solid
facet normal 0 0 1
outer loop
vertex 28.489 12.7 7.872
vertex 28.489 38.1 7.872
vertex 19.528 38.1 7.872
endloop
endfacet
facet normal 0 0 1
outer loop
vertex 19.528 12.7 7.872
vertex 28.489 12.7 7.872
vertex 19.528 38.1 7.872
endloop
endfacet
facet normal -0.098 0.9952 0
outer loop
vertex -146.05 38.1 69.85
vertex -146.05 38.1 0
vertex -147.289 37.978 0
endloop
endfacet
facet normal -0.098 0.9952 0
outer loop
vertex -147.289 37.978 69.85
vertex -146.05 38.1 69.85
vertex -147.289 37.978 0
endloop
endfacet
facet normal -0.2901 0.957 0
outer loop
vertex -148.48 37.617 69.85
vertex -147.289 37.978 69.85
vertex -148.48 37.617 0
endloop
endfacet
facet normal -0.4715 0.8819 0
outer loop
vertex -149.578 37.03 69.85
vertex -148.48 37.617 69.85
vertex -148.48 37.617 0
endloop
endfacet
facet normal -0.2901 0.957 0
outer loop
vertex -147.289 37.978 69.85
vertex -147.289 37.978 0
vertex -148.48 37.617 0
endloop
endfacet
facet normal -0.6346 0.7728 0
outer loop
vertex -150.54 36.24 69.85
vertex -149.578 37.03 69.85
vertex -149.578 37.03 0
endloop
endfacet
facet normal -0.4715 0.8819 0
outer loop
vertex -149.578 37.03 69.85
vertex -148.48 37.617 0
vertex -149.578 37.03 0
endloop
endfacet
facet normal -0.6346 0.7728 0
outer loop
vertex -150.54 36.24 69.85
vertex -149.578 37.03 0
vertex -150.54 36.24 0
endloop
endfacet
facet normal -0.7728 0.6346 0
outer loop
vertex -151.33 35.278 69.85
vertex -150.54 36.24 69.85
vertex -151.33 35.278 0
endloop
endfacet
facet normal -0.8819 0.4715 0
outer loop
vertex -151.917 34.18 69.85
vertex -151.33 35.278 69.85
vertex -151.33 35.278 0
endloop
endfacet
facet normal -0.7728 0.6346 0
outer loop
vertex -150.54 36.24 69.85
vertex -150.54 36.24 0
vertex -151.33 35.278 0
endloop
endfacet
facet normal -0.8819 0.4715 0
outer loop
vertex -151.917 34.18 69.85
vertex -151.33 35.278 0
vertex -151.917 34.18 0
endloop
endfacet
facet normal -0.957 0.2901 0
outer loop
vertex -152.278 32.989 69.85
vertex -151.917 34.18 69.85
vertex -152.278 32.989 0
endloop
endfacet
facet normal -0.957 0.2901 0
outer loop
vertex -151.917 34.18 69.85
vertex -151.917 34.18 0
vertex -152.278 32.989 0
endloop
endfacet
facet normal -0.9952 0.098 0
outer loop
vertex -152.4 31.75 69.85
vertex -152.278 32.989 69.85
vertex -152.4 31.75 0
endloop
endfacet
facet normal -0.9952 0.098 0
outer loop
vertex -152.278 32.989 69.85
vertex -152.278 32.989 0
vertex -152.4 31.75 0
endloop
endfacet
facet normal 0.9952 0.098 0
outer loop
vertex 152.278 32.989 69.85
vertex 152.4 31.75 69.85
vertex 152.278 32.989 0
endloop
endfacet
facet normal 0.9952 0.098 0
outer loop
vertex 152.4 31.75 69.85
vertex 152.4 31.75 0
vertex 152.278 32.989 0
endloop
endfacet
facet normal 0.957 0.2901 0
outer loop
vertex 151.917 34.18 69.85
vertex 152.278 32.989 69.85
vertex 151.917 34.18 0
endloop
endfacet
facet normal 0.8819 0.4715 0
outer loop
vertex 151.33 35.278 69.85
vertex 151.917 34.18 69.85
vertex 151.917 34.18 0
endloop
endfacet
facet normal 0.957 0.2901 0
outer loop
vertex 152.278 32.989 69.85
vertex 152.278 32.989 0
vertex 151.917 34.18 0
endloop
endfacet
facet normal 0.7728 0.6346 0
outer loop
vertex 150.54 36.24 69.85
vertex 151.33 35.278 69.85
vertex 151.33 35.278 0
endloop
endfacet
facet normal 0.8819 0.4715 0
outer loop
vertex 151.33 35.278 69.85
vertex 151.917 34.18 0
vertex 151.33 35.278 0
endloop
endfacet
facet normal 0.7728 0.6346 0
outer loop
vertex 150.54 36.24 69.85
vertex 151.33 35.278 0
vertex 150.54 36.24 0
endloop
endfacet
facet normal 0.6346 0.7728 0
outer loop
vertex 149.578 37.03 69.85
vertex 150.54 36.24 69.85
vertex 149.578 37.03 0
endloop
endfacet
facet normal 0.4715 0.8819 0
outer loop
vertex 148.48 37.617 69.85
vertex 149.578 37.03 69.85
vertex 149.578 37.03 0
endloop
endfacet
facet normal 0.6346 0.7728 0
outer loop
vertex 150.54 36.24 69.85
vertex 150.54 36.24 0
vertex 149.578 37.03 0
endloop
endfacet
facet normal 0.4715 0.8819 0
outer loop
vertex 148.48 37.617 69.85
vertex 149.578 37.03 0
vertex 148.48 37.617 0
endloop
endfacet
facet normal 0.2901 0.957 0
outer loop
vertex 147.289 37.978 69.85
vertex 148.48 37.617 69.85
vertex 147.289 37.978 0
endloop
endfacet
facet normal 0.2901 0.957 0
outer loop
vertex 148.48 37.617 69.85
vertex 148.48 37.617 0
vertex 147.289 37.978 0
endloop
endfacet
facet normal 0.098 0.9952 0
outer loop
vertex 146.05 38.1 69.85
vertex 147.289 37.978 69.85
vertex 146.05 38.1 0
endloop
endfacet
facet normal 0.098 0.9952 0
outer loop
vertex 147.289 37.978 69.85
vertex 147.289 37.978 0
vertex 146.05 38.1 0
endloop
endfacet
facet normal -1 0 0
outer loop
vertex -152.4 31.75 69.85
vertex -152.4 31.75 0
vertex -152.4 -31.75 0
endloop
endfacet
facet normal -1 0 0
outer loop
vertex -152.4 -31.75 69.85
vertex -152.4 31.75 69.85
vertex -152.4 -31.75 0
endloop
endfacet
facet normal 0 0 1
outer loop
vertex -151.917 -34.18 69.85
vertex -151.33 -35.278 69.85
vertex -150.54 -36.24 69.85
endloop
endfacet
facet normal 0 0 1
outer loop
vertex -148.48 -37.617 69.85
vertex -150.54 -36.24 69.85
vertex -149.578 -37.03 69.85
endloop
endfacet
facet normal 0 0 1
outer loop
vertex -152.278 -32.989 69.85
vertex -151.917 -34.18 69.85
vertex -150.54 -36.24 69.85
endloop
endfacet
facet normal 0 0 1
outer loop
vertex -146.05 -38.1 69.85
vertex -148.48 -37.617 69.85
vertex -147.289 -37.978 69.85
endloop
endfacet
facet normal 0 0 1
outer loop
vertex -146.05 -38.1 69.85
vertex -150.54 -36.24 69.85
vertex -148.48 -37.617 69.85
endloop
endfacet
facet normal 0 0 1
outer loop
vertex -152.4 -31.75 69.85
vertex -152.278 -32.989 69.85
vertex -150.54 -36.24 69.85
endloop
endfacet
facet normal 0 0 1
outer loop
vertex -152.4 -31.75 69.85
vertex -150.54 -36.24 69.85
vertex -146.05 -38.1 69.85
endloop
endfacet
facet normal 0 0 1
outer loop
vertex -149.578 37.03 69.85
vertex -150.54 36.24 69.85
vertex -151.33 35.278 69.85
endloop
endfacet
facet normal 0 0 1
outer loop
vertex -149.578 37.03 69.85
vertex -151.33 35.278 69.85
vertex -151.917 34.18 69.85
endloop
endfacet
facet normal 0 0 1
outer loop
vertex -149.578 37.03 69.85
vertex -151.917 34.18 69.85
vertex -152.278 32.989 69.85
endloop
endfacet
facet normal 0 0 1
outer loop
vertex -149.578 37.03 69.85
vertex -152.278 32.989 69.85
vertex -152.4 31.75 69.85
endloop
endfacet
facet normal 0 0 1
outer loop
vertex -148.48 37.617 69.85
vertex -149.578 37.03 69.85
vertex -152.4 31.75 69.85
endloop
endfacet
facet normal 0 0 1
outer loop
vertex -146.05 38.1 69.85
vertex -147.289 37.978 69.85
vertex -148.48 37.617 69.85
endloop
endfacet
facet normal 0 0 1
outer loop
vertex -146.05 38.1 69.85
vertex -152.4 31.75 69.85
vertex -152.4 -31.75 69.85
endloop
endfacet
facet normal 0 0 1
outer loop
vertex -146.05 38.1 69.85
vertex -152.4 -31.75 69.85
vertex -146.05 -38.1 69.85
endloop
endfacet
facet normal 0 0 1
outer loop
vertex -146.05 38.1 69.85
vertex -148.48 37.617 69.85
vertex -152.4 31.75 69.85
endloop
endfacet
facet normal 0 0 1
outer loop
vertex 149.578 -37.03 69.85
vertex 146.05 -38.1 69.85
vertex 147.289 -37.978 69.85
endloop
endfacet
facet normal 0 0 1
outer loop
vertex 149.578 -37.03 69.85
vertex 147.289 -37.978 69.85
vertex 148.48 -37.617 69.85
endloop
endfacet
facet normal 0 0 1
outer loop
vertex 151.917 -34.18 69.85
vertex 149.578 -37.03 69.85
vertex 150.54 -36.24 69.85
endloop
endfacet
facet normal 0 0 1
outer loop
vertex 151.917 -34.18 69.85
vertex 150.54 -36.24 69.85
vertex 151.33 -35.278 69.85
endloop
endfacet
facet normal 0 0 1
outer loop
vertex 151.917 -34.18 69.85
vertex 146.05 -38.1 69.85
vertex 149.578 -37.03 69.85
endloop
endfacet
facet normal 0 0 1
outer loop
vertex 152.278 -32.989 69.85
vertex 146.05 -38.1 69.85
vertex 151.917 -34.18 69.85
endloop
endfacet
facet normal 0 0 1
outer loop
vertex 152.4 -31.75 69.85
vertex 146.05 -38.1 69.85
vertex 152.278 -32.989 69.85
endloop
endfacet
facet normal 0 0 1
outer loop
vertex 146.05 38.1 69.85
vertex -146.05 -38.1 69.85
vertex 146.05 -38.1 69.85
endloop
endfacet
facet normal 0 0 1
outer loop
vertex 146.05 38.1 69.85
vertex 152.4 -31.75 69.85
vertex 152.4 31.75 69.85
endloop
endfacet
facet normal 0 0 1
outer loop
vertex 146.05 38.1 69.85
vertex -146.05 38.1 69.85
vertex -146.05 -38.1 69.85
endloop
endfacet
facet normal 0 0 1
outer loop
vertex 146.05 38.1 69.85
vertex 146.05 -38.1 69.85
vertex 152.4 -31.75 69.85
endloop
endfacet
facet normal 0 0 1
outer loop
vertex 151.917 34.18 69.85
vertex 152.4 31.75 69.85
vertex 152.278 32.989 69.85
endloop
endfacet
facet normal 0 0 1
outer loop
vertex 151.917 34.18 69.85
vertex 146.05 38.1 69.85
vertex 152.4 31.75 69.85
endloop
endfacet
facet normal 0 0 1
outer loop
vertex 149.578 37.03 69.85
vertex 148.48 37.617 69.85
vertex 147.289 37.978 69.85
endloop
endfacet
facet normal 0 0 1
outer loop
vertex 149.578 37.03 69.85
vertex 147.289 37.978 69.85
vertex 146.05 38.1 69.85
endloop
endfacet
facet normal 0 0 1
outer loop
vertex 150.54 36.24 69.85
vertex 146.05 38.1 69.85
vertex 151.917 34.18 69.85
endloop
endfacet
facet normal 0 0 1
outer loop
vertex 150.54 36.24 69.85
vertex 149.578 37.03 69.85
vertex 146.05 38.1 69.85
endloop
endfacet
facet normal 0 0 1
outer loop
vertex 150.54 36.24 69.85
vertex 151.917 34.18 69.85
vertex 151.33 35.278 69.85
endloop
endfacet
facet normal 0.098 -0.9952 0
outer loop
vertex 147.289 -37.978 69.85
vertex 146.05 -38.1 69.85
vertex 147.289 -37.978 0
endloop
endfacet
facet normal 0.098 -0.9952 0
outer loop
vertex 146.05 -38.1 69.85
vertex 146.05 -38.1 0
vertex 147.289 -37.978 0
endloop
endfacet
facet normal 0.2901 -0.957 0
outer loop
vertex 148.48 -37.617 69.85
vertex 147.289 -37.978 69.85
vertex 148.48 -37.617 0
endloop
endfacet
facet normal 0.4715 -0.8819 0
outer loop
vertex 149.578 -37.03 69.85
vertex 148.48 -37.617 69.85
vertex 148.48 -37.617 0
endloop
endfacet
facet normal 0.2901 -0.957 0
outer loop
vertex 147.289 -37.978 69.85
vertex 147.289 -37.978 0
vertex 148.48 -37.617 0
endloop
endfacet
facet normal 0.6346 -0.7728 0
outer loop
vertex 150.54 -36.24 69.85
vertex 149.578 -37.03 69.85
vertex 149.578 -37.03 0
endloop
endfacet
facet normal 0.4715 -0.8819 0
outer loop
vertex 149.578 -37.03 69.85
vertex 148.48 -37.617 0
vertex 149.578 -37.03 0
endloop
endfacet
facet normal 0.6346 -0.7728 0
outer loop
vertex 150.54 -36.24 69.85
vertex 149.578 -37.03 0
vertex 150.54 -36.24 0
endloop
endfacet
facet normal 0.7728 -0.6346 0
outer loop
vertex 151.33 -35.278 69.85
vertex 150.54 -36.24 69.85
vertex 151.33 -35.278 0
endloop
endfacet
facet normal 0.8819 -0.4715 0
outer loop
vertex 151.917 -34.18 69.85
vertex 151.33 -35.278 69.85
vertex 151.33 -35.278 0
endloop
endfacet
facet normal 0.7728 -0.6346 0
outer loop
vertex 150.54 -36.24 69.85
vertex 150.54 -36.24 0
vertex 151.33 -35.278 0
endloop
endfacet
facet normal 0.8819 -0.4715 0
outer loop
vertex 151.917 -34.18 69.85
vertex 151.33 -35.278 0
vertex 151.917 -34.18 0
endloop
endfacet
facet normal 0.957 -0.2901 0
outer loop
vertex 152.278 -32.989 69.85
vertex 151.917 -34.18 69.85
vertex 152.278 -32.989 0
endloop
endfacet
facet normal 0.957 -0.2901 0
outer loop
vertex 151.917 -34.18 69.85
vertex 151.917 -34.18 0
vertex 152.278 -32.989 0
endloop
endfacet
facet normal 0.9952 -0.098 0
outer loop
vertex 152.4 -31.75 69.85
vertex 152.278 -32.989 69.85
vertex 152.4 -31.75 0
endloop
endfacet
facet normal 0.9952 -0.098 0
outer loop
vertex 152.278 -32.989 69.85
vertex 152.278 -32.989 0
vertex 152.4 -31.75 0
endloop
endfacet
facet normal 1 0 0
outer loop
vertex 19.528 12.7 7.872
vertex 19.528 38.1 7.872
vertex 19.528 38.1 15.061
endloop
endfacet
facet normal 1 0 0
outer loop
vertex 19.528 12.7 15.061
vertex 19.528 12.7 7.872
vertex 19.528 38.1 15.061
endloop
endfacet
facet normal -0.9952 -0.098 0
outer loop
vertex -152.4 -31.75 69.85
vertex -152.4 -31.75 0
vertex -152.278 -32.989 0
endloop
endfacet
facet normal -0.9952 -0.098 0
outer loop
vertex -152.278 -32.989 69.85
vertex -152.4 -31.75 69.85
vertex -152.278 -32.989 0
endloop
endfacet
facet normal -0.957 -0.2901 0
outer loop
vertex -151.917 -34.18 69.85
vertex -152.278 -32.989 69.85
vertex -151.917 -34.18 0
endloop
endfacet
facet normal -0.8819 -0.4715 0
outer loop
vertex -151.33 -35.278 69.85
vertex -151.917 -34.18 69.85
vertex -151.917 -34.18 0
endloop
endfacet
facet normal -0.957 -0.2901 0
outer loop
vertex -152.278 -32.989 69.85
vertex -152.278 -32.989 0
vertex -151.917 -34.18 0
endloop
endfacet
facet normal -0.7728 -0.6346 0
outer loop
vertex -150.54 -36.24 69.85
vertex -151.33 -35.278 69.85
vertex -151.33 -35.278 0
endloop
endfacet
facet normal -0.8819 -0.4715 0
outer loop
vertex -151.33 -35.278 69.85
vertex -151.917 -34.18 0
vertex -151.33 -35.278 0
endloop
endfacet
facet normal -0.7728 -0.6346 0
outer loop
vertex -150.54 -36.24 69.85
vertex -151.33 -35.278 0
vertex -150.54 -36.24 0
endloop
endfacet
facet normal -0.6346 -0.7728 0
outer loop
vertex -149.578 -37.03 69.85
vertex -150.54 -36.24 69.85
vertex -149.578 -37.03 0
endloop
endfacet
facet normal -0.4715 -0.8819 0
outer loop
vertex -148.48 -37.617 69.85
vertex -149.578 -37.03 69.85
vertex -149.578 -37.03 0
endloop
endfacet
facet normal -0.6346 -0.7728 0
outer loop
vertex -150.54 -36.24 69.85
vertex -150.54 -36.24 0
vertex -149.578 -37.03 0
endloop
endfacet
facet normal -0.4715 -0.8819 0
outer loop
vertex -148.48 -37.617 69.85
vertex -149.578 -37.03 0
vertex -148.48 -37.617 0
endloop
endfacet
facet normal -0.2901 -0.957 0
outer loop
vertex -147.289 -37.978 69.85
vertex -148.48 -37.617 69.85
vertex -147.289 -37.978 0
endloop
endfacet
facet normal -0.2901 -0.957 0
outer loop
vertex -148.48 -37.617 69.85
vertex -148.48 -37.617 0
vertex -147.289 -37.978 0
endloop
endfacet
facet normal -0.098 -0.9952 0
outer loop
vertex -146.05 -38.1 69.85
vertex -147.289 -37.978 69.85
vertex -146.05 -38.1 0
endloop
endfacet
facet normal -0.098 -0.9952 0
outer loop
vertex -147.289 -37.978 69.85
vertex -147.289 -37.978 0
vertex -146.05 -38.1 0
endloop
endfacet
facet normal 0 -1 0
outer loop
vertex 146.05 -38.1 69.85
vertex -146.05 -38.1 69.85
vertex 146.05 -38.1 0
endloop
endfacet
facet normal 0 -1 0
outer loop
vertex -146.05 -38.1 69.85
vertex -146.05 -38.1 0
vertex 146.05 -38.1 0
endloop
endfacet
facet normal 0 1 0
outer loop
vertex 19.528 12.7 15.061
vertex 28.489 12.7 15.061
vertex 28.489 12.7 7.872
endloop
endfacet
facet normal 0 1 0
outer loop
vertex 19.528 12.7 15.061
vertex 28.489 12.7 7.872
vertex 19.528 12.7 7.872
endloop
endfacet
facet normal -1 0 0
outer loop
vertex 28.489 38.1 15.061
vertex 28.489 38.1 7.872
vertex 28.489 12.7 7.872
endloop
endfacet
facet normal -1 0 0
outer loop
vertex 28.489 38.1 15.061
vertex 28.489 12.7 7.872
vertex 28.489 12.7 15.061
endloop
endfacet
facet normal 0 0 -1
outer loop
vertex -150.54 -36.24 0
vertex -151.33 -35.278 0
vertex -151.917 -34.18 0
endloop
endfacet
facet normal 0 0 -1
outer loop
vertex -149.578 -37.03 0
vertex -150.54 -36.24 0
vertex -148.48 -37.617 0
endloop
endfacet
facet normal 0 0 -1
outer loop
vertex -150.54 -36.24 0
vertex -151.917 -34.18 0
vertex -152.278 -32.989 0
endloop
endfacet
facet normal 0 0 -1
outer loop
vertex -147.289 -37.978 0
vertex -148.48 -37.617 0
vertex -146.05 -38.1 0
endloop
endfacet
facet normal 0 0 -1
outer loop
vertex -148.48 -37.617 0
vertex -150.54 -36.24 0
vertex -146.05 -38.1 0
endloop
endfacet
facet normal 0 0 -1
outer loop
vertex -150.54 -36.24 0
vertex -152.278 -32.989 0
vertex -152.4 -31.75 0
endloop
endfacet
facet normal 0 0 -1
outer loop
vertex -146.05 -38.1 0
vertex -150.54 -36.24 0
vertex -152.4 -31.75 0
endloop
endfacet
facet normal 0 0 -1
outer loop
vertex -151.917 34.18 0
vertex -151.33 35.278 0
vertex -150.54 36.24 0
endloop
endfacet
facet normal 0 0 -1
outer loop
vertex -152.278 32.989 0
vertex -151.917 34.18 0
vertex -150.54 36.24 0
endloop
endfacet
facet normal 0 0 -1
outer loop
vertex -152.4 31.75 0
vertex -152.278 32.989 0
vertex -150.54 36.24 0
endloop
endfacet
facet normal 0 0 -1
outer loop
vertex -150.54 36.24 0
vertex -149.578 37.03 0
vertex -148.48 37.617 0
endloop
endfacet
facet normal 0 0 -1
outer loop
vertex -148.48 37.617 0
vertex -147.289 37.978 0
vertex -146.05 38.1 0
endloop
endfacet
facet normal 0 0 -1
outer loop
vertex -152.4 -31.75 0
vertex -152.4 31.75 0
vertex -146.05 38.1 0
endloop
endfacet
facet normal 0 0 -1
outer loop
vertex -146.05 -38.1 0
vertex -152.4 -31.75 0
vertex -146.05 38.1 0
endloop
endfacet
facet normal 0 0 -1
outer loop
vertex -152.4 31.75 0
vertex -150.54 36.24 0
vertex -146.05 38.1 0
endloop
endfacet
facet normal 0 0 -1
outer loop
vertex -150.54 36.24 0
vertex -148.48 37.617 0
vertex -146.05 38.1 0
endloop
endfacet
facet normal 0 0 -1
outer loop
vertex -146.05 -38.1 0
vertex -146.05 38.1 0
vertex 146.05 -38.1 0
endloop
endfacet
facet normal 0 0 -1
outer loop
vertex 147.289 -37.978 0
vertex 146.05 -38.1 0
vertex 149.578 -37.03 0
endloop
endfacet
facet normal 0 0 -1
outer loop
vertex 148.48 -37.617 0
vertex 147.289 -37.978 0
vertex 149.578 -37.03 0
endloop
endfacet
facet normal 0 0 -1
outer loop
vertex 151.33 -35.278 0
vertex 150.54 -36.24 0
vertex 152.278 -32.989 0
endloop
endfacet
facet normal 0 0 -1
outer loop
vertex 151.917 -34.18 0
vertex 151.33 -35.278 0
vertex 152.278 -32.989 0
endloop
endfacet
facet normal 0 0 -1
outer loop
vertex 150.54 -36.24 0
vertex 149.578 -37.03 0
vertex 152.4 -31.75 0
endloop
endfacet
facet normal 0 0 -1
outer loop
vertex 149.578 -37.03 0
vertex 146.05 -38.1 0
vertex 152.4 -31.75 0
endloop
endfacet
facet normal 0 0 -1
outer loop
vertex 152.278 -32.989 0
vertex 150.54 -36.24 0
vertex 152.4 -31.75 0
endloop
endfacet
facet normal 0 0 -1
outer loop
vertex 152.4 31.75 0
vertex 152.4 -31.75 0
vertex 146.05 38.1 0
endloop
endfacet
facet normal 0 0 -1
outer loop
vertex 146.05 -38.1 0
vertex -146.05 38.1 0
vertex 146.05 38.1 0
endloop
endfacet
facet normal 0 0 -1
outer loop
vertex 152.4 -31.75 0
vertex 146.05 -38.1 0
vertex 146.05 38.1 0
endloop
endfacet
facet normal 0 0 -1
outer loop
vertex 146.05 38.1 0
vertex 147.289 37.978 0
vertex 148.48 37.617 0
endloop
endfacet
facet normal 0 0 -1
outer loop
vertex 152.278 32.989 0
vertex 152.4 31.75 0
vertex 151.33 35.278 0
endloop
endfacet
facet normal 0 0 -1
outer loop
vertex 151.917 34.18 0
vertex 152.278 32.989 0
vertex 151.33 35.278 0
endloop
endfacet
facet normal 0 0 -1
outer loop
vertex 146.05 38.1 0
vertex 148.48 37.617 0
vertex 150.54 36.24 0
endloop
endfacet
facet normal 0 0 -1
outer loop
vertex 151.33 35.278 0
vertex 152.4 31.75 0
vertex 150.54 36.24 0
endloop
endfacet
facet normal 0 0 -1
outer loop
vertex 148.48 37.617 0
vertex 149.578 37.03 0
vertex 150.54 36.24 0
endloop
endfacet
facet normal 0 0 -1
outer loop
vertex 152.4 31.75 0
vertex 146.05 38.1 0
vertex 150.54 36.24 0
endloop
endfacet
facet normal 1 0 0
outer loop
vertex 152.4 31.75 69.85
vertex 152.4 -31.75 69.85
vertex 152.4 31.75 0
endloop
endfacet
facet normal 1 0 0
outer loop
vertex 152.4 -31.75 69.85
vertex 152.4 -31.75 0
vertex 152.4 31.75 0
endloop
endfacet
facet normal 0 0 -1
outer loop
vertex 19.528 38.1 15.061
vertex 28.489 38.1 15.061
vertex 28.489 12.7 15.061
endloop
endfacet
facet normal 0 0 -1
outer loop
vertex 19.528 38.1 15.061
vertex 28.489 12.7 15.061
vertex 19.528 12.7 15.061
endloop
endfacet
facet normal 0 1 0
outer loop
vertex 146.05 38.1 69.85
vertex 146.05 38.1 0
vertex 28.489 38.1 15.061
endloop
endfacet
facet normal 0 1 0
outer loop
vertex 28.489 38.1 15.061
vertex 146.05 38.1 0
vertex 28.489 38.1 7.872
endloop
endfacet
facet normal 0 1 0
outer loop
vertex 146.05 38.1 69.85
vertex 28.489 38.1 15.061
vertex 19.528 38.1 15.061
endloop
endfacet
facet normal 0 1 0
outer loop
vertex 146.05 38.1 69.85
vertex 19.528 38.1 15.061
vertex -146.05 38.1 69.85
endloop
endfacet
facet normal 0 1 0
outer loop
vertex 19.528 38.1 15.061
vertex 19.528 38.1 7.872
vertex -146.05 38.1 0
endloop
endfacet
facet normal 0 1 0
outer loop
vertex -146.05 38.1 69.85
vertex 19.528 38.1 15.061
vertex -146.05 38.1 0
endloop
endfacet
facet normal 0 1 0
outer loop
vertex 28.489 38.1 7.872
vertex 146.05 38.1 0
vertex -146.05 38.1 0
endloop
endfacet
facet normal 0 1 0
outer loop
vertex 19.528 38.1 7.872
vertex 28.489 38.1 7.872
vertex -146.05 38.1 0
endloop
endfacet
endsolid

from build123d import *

# Parameters (mm, degrees)
F5_DEPTH = 6.35
F1_DEPTH = 63.5
F2_W     = 8.9604817331
F2_H     = 7.1887969971
F3_DEPTH = 25.4


with BuildPart() as f5:
    # F4 (on Top) → F5 (new body)
    with BuildSketch(Plane.XY):
        with BuildLine():
            Line((-146.05, -38.1), (146.05, -38.1))
            ThreePointArc((146.05, -38.1), (150.5401280605, -36.2401280605), (152.4, -31.75))
            Line((152.4, -31.75), (152.4, 31.75))
            ThreePointArc((152.4, 31.75), (150.5401280605, 36.2401280605), (146.05, 38.1))
            Line((146.05, 38.1), (-146.05, 38.1))
            ThreePointArc((-146.05, 38.1), (-150.5401280605, 36.2401280605), (-152.4, 31.75))
            Line((-152.4, 31.75), (-152.4, -31.75))
            ThreePointArc((-152.4, -31.75), (-150.5401280605, -36.2401280605), (-146.05, -38.1))
        make_face()
    extrude(amount=F5_DEPTH)

    # F0 (on face) → F1 (join)
    with BuildSketch(Plane.XY.offset(6.35)):
        with BuildLine():
            ThreePointArc((-152.4, -31.75), (-150.5401280605, -36.2401280605), (-146.05, -38.1))
            Line((-146.05, -38.1), (146.05, -38.1))
            ThreePointArc((146.05, -38.1), (150.5401280605, -36.2401280605), (152.4, -31.75))
            Line((152.4, -31.75), (152.4, 31.75))
            ThreePointArc((152.4, 31.75), (150.5401280605, 36.2401280605), (146.05, 38.1))
            Line((146.05, 38.1), (-146.05, 38.1))
            ThreePointArc((-146.05, 38.1), (-150.5401280605, 36.2401280605), (-152.4, 31.75))
            Line((-152.4, 31.75), (-152.4, -31.75))
        make_face()
    extrude(amount=F1_DEPTH)

    # F2 (on face) → F3 (cut)
    with BuildSketch(Plane(origin=(0, 38.1, 0), x_dir=(-1, 0, 0), z_dir=(0, 1, 0))):
        with Locations((-24.0083169192, 11.4666037261)):
            Rectangle(F2_W, F2_H)
    extrude(amount=-F3_DEPTH, mode=Mode.SUBTRACT)


solid = f5.part
